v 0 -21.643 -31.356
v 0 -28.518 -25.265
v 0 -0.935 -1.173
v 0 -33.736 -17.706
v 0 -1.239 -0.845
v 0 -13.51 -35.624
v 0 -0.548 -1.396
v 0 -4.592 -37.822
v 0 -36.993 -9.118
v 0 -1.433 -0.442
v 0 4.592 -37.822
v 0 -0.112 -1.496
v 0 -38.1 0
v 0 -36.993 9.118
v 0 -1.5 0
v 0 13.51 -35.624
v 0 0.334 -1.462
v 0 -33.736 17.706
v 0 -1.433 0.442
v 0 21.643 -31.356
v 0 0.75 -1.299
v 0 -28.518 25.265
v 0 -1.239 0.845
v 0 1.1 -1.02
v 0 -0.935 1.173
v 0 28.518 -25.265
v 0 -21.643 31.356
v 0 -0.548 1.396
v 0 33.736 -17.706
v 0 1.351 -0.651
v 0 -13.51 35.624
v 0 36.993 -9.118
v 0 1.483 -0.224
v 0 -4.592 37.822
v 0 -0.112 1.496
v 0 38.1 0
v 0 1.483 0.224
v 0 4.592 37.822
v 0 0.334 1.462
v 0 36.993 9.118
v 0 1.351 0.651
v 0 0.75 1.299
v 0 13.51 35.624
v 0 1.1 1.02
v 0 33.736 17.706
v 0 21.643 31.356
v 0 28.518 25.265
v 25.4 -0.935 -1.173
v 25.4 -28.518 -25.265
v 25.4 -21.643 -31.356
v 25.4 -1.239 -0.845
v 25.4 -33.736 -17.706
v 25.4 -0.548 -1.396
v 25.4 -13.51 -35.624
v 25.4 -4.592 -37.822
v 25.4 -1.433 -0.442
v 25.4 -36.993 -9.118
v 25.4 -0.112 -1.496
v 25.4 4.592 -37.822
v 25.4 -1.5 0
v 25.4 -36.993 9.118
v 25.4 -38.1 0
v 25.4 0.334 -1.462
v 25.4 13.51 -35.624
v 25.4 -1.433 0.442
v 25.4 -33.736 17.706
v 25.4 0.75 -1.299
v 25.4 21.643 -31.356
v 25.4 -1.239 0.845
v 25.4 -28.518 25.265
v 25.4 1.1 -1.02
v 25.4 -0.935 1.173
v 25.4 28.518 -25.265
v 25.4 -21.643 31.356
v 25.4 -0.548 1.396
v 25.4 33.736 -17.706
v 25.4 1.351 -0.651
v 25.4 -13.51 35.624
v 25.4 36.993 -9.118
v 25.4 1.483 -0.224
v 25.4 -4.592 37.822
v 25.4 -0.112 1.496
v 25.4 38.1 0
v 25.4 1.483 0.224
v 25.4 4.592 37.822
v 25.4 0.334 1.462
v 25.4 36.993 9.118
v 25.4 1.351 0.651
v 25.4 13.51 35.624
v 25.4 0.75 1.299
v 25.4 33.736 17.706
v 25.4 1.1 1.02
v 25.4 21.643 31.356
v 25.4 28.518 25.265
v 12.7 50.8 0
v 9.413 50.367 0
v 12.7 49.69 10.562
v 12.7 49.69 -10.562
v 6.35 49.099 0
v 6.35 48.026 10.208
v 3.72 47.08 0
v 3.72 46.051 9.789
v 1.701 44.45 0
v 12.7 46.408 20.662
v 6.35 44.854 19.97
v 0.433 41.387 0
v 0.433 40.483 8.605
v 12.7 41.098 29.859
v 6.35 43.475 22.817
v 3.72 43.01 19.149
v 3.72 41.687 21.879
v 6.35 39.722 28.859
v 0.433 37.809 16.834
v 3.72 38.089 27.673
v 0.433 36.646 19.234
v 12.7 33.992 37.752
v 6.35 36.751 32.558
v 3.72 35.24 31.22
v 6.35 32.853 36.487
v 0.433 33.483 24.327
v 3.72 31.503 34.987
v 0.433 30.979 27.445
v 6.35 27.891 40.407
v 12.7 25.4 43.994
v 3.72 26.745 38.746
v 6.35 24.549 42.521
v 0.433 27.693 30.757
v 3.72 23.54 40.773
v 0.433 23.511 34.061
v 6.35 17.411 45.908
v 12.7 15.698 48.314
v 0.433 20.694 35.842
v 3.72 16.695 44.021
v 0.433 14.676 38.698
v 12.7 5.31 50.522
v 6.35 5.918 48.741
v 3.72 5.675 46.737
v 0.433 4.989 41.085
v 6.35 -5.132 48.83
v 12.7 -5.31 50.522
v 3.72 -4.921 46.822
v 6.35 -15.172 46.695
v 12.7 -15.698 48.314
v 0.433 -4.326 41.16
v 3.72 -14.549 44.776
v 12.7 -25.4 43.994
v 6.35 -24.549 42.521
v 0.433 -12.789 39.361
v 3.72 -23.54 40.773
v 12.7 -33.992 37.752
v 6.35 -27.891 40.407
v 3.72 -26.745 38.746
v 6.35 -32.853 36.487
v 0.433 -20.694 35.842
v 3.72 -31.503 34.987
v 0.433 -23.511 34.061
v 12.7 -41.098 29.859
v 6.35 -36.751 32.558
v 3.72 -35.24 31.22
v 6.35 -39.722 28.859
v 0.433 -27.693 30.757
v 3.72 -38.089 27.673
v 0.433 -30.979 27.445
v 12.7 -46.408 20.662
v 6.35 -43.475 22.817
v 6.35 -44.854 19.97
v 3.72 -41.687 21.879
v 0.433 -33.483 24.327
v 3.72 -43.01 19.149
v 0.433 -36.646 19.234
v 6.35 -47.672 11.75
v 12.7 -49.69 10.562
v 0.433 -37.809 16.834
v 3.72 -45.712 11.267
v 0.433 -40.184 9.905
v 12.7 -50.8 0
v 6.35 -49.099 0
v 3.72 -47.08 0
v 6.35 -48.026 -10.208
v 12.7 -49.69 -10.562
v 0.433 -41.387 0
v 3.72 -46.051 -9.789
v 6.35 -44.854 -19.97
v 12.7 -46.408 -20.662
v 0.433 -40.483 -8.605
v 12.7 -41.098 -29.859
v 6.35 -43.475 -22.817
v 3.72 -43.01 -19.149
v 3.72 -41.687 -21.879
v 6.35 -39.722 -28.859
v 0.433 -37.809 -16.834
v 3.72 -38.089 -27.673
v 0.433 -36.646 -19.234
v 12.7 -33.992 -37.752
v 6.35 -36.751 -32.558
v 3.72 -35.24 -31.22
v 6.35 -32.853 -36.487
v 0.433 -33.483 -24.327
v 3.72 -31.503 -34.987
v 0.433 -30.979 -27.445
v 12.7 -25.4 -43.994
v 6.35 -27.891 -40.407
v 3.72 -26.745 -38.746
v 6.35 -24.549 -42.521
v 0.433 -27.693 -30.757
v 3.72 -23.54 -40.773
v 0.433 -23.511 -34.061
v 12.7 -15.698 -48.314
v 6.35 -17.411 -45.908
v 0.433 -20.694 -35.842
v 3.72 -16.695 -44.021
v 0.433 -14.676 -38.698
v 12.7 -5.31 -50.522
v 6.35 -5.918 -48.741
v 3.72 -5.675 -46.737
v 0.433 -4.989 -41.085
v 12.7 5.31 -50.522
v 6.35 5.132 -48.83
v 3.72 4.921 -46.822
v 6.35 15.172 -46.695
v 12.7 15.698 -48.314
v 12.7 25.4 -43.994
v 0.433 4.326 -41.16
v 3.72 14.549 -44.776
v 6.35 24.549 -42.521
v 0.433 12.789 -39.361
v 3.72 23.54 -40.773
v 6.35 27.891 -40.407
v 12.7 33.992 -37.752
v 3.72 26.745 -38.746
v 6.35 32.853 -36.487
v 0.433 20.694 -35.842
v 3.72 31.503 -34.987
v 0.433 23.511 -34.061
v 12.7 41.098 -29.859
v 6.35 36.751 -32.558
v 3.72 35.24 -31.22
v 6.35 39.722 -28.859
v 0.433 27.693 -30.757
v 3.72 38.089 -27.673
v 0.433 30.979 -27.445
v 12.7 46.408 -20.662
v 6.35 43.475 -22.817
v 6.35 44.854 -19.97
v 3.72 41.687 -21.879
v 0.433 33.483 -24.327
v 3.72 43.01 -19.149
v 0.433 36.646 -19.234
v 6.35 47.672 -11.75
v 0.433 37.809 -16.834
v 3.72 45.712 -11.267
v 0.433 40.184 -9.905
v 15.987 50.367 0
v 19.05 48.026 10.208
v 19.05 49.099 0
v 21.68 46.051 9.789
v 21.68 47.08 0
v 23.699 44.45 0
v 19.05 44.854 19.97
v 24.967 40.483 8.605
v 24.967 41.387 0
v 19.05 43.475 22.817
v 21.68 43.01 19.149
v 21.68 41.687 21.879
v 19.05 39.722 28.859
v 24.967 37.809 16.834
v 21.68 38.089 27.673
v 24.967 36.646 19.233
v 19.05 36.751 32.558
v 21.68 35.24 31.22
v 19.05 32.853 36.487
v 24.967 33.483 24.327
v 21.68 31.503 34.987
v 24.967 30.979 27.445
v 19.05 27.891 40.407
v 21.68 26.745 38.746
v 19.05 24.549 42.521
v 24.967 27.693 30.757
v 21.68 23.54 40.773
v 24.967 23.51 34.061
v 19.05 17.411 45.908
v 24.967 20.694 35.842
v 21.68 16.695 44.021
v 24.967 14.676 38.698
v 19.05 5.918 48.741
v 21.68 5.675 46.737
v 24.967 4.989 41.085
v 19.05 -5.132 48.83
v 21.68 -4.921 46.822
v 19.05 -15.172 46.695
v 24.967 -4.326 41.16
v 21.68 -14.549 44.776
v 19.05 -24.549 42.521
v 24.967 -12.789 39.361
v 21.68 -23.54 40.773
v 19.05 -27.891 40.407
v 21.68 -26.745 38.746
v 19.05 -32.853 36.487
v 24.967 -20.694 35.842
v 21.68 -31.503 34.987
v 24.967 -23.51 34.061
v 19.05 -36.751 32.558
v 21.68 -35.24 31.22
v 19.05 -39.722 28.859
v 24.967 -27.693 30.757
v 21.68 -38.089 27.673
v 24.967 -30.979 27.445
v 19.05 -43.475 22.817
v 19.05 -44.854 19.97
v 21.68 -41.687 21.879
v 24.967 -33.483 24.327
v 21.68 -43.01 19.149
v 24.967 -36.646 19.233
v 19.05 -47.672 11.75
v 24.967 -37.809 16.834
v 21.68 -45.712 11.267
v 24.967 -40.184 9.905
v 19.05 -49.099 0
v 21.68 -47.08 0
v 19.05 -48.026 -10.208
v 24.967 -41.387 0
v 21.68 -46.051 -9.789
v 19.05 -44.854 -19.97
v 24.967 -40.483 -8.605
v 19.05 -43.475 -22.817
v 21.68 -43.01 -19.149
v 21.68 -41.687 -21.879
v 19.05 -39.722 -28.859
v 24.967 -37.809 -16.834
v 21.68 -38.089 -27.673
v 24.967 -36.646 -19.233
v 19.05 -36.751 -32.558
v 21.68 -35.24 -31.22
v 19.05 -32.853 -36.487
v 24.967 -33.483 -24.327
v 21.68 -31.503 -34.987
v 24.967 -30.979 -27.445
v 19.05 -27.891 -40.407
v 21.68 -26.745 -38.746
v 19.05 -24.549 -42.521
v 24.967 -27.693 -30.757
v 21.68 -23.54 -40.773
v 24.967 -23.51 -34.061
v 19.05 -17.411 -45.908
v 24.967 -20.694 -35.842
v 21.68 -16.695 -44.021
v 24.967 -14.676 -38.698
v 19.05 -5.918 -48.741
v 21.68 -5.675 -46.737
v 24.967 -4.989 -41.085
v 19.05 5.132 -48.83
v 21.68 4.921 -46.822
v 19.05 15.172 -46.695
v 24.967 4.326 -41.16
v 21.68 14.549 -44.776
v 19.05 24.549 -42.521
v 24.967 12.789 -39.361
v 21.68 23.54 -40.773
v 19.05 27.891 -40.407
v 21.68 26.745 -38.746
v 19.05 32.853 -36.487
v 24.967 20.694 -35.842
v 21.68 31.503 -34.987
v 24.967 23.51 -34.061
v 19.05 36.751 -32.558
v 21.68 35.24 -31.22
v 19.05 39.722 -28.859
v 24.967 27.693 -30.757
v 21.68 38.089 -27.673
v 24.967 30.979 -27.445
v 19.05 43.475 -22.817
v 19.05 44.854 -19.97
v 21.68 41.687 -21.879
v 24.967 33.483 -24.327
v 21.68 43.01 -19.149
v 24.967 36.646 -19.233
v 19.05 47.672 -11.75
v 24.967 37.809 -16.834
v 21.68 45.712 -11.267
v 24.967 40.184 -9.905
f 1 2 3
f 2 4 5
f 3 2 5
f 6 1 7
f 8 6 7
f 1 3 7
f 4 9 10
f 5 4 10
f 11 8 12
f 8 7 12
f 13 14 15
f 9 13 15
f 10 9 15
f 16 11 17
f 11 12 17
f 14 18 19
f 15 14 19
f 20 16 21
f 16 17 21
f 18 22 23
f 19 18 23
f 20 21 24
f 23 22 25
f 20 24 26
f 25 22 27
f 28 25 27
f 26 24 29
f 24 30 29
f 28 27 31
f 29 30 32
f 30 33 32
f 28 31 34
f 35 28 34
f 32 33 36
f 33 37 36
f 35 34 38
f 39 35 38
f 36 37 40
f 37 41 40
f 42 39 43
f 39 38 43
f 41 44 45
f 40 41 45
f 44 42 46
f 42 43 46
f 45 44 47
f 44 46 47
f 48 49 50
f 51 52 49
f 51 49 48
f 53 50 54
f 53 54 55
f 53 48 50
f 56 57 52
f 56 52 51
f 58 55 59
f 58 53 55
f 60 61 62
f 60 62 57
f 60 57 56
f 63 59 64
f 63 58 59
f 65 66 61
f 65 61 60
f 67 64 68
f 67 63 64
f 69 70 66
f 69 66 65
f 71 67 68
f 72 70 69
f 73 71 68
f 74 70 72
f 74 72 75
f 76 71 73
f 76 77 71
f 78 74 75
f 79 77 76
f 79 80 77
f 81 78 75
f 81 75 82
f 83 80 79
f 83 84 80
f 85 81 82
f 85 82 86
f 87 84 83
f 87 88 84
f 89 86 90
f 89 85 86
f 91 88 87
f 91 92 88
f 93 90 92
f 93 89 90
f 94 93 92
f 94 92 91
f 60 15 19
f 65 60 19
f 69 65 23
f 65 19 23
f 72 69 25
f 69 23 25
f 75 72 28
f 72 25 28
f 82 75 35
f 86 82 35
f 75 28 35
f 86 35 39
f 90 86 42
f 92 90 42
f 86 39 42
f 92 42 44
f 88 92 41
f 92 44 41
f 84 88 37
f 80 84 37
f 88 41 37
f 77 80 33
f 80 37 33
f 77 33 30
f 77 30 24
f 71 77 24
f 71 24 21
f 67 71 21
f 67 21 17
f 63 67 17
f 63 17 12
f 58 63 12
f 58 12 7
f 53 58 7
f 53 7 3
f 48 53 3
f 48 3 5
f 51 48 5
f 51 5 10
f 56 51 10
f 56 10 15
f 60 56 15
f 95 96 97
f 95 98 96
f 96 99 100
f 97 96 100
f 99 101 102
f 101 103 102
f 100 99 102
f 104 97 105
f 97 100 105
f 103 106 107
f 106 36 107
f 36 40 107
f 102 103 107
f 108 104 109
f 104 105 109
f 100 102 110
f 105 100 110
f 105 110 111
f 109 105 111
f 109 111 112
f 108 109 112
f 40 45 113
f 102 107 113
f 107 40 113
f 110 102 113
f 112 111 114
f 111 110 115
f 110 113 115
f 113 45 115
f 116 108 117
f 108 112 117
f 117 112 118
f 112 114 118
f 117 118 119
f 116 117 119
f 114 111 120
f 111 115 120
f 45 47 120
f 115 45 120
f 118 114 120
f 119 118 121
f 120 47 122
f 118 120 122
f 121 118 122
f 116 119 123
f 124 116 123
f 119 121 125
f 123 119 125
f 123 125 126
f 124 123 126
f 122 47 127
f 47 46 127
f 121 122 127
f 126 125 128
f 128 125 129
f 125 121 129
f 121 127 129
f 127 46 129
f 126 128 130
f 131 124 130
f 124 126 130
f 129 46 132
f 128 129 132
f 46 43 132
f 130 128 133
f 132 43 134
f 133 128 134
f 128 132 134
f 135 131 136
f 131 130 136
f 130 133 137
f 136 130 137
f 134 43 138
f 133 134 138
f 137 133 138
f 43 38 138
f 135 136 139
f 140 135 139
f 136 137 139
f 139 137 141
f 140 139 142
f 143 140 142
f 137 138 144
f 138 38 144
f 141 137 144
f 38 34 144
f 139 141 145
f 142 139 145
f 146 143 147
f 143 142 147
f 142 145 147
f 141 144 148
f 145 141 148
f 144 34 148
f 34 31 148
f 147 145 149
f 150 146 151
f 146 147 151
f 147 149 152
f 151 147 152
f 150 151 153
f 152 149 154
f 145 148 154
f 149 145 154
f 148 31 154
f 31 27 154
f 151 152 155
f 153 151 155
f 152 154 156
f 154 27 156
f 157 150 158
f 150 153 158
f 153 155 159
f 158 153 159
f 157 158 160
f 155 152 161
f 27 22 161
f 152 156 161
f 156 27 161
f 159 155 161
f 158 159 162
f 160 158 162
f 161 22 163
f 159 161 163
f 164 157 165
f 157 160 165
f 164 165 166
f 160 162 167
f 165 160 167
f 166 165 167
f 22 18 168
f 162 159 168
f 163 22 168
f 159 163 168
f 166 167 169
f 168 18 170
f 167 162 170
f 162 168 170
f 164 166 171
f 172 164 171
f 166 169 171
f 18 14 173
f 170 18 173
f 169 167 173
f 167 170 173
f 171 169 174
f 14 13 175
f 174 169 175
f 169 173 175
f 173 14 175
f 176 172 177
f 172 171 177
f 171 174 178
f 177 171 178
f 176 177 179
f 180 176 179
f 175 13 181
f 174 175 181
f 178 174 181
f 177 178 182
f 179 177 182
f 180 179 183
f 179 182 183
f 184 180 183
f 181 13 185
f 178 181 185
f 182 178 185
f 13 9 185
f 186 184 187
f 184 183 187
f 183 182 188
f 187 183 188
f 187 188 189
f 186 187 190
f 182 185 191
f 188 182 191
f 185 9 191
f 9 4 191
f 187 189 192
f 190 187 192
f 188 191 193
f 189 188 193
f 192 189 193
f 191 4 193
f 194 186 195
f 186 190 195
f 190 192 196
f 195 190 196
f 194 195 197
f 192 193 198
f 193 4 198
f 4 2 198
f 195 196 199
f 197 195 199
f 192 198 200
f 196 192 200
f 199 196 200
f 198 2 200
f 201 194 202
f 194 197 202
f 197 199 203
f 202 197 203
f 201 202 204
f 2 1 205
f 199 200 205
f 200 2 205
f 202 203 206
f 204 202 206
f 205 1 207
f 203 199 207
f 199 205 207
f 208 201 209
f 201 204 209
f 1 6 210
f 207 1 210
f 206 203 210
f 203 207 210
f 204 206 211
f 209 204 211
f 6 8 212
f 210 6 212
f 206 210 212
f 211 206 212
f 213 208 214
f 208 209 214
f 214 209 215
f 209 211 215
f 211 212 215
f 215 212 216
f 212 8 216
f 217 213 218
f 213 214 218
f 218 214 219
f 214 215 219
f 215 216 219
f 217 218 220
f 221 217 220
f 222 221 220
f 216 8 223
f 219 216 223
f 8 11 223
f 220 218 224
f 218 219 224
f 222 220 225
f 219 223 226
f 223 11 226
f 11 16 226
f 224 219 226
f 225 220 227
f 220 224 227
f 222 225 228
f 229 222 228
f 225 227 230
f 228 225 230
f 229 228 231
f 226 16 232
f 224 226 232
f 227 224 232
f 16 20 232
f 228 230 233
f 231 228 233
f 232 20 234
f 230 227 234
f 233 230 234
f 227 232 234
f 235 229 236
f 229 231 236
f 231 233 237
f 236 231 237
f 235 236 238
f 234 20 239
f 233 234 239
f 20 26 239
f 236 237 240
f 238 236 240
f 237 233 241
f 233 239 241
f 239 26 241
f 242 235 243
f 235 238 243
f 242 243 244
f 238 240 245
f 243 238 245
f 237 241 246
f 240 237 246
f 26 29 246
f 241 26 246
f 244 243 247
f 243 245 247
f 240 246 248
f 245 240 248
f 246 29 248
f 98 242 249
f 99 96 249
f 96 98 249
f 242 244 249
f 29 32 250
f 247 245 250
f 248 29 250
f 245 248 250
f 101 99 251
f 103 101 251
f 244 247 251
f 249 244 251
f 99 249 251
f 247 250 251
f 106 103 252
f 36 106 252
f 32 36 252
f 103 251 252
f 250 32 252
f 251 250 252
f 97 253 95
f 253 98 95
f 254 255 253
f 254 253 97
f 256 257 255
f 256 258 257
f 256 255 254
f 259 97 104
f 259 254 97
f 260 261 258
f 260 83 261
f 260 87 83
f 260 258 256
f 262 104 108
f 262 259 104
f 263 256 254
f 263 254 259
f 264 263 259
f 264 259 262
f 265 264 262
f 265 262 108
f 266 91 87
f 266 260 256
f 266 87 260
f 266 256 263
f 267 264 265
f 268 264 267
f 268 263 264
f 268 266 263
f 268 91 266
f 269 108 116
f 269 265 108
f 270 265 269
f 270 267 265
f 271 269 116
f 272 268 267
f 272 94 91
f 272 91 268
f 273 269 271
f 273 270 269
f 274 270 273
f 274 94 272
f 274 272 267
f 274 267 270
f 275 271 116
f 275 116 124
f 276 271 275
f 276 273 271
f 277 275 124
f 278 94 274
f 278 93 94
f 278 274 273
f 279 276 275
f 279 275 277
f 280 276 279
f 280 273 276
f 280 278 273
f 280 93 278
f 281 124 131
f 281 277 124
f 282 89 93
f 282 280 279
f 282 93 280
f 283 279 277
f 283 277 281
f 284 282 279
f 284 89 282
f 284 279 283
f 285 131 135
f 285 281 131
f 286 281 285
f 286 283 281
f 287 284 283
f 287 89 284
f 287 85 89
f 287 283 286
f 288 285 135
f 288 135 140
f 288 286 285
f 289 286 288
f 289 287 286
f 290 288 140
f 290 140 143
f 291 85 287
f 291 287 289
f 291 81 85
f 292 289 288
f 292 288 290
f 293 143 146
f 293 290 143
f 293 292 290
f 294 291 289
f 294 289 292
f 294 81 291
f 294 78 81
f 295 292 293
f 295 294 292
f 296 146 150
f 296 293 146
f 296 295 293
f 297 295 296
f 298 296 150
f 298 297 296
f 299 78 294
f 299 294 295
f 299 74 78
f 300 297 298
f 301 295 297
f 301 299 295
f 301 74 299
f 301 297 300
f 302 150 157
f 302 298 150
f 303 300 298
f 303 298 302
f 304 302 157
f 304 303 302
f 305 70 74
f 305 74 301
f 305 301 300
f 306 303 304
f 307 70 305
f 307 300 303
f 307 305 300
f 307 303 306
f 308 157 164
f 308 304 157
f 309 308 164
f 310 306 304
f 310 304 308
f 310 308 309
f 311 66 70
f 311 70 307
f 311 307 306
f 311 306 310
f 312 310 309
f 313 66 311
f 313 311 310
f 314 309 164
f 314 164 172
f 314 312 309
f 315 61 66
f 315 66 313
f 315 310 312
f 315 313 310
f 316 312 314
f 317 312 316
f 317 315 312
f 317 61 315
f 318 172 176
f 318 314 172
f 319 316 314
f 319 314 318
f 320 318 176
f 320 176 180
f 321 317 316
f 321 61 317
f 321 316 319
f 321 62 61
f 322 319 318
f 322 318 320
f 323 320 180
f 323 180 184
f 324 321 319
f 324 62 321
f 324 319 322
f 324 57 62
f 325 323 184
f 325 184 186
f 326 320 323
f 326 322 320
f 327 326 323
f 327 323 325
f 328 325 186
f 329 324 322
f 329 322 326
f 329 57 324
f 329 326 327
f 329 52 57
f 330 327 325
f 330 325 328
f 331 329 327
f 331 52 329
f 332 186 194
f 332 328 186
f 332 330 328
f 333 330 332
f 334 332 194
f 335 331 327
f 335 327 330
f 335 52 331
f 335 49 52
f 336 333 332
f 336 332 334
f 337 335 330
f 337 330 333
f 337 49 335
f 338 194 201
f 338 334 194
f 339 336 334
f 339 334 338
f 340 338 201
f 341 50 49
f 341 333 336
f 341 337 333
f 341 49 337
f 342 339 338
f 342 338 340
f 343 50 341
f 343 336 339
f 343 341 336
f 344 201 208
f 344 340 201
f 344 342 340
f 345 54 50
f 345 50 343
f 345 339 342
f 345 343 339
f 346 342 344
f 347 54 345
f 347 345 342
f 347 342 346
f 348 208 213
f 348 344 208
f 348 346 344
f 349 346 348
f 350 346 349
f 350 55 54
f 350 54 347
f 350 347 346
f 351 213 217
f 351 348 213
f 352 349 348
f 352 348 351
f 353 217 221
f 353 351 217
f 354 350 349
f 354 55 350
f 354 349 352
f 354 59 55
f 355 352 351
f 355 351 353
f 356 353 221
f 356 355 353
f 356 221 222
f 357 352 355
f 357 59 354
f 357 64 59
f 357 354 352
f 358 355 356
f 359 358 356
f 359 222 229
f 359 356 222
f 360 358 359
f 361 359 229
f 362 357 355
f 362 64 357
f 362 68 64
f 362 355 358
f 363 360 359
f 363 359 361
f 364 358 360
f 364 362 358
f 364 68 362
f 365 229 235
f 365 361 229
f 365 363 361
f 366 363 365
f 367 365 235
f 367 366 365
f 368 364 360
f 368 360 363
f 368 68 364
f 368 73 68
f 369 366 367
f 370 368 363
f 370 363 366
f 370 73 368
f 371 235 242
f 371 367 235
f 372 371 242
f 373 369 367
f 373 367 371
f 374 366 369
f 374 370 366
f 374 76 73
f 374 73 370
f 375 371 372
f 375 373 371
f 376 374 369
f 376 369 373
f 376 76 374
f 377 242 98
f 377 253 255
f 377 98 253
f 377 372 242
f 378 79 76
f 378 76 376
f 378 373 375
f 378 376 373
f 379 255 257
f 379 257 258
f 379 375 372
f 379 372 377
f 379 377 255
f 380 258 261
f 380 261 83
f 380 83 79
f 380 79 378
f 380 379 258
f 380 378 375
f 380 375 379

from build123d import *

# Parameters (mm, degrees)
F0_R     = 50.8
F1_DEPTH = 25.4
F2_R     = 12.7
F3_R     = 12.69999
F5_D     = 2.999994


# Not quite as in the source:
# - a fillet or chamfer is up to 0.001 mm smaller than in the source, because OpenCascade refuses the exact size


with BuildPart() as f1:
    # F0 (on Right) → F1 (new body)
    with BuildSketch(Plane.YZ):
        Circle(F0_R)
    extrude(amount=F1_DEPTH)

    # F2
    f2_edges = [f1.edges().sort_by_distance(p)[0] for p in [
        (25.4, -50.8, 0),
    ]]
    fillet(f2_edges, radius=F2_R)

    # F3 (radius 12.7 in the source; OpenCascade refuses exactly that, so slightly less here)
    f3_edges = [f1.edges().sort_by_distance(p)[0] for p in [
        (0, -50.8, 0),
    ]]
    fillet(f3_edges, radius=F3_R)

    # F5 (through all)
    with Locations(Plane.YZ.offset(25.4)):
        with Locations((0, 0)):
            Hole(F5_D / 2)


solid = f1.part
